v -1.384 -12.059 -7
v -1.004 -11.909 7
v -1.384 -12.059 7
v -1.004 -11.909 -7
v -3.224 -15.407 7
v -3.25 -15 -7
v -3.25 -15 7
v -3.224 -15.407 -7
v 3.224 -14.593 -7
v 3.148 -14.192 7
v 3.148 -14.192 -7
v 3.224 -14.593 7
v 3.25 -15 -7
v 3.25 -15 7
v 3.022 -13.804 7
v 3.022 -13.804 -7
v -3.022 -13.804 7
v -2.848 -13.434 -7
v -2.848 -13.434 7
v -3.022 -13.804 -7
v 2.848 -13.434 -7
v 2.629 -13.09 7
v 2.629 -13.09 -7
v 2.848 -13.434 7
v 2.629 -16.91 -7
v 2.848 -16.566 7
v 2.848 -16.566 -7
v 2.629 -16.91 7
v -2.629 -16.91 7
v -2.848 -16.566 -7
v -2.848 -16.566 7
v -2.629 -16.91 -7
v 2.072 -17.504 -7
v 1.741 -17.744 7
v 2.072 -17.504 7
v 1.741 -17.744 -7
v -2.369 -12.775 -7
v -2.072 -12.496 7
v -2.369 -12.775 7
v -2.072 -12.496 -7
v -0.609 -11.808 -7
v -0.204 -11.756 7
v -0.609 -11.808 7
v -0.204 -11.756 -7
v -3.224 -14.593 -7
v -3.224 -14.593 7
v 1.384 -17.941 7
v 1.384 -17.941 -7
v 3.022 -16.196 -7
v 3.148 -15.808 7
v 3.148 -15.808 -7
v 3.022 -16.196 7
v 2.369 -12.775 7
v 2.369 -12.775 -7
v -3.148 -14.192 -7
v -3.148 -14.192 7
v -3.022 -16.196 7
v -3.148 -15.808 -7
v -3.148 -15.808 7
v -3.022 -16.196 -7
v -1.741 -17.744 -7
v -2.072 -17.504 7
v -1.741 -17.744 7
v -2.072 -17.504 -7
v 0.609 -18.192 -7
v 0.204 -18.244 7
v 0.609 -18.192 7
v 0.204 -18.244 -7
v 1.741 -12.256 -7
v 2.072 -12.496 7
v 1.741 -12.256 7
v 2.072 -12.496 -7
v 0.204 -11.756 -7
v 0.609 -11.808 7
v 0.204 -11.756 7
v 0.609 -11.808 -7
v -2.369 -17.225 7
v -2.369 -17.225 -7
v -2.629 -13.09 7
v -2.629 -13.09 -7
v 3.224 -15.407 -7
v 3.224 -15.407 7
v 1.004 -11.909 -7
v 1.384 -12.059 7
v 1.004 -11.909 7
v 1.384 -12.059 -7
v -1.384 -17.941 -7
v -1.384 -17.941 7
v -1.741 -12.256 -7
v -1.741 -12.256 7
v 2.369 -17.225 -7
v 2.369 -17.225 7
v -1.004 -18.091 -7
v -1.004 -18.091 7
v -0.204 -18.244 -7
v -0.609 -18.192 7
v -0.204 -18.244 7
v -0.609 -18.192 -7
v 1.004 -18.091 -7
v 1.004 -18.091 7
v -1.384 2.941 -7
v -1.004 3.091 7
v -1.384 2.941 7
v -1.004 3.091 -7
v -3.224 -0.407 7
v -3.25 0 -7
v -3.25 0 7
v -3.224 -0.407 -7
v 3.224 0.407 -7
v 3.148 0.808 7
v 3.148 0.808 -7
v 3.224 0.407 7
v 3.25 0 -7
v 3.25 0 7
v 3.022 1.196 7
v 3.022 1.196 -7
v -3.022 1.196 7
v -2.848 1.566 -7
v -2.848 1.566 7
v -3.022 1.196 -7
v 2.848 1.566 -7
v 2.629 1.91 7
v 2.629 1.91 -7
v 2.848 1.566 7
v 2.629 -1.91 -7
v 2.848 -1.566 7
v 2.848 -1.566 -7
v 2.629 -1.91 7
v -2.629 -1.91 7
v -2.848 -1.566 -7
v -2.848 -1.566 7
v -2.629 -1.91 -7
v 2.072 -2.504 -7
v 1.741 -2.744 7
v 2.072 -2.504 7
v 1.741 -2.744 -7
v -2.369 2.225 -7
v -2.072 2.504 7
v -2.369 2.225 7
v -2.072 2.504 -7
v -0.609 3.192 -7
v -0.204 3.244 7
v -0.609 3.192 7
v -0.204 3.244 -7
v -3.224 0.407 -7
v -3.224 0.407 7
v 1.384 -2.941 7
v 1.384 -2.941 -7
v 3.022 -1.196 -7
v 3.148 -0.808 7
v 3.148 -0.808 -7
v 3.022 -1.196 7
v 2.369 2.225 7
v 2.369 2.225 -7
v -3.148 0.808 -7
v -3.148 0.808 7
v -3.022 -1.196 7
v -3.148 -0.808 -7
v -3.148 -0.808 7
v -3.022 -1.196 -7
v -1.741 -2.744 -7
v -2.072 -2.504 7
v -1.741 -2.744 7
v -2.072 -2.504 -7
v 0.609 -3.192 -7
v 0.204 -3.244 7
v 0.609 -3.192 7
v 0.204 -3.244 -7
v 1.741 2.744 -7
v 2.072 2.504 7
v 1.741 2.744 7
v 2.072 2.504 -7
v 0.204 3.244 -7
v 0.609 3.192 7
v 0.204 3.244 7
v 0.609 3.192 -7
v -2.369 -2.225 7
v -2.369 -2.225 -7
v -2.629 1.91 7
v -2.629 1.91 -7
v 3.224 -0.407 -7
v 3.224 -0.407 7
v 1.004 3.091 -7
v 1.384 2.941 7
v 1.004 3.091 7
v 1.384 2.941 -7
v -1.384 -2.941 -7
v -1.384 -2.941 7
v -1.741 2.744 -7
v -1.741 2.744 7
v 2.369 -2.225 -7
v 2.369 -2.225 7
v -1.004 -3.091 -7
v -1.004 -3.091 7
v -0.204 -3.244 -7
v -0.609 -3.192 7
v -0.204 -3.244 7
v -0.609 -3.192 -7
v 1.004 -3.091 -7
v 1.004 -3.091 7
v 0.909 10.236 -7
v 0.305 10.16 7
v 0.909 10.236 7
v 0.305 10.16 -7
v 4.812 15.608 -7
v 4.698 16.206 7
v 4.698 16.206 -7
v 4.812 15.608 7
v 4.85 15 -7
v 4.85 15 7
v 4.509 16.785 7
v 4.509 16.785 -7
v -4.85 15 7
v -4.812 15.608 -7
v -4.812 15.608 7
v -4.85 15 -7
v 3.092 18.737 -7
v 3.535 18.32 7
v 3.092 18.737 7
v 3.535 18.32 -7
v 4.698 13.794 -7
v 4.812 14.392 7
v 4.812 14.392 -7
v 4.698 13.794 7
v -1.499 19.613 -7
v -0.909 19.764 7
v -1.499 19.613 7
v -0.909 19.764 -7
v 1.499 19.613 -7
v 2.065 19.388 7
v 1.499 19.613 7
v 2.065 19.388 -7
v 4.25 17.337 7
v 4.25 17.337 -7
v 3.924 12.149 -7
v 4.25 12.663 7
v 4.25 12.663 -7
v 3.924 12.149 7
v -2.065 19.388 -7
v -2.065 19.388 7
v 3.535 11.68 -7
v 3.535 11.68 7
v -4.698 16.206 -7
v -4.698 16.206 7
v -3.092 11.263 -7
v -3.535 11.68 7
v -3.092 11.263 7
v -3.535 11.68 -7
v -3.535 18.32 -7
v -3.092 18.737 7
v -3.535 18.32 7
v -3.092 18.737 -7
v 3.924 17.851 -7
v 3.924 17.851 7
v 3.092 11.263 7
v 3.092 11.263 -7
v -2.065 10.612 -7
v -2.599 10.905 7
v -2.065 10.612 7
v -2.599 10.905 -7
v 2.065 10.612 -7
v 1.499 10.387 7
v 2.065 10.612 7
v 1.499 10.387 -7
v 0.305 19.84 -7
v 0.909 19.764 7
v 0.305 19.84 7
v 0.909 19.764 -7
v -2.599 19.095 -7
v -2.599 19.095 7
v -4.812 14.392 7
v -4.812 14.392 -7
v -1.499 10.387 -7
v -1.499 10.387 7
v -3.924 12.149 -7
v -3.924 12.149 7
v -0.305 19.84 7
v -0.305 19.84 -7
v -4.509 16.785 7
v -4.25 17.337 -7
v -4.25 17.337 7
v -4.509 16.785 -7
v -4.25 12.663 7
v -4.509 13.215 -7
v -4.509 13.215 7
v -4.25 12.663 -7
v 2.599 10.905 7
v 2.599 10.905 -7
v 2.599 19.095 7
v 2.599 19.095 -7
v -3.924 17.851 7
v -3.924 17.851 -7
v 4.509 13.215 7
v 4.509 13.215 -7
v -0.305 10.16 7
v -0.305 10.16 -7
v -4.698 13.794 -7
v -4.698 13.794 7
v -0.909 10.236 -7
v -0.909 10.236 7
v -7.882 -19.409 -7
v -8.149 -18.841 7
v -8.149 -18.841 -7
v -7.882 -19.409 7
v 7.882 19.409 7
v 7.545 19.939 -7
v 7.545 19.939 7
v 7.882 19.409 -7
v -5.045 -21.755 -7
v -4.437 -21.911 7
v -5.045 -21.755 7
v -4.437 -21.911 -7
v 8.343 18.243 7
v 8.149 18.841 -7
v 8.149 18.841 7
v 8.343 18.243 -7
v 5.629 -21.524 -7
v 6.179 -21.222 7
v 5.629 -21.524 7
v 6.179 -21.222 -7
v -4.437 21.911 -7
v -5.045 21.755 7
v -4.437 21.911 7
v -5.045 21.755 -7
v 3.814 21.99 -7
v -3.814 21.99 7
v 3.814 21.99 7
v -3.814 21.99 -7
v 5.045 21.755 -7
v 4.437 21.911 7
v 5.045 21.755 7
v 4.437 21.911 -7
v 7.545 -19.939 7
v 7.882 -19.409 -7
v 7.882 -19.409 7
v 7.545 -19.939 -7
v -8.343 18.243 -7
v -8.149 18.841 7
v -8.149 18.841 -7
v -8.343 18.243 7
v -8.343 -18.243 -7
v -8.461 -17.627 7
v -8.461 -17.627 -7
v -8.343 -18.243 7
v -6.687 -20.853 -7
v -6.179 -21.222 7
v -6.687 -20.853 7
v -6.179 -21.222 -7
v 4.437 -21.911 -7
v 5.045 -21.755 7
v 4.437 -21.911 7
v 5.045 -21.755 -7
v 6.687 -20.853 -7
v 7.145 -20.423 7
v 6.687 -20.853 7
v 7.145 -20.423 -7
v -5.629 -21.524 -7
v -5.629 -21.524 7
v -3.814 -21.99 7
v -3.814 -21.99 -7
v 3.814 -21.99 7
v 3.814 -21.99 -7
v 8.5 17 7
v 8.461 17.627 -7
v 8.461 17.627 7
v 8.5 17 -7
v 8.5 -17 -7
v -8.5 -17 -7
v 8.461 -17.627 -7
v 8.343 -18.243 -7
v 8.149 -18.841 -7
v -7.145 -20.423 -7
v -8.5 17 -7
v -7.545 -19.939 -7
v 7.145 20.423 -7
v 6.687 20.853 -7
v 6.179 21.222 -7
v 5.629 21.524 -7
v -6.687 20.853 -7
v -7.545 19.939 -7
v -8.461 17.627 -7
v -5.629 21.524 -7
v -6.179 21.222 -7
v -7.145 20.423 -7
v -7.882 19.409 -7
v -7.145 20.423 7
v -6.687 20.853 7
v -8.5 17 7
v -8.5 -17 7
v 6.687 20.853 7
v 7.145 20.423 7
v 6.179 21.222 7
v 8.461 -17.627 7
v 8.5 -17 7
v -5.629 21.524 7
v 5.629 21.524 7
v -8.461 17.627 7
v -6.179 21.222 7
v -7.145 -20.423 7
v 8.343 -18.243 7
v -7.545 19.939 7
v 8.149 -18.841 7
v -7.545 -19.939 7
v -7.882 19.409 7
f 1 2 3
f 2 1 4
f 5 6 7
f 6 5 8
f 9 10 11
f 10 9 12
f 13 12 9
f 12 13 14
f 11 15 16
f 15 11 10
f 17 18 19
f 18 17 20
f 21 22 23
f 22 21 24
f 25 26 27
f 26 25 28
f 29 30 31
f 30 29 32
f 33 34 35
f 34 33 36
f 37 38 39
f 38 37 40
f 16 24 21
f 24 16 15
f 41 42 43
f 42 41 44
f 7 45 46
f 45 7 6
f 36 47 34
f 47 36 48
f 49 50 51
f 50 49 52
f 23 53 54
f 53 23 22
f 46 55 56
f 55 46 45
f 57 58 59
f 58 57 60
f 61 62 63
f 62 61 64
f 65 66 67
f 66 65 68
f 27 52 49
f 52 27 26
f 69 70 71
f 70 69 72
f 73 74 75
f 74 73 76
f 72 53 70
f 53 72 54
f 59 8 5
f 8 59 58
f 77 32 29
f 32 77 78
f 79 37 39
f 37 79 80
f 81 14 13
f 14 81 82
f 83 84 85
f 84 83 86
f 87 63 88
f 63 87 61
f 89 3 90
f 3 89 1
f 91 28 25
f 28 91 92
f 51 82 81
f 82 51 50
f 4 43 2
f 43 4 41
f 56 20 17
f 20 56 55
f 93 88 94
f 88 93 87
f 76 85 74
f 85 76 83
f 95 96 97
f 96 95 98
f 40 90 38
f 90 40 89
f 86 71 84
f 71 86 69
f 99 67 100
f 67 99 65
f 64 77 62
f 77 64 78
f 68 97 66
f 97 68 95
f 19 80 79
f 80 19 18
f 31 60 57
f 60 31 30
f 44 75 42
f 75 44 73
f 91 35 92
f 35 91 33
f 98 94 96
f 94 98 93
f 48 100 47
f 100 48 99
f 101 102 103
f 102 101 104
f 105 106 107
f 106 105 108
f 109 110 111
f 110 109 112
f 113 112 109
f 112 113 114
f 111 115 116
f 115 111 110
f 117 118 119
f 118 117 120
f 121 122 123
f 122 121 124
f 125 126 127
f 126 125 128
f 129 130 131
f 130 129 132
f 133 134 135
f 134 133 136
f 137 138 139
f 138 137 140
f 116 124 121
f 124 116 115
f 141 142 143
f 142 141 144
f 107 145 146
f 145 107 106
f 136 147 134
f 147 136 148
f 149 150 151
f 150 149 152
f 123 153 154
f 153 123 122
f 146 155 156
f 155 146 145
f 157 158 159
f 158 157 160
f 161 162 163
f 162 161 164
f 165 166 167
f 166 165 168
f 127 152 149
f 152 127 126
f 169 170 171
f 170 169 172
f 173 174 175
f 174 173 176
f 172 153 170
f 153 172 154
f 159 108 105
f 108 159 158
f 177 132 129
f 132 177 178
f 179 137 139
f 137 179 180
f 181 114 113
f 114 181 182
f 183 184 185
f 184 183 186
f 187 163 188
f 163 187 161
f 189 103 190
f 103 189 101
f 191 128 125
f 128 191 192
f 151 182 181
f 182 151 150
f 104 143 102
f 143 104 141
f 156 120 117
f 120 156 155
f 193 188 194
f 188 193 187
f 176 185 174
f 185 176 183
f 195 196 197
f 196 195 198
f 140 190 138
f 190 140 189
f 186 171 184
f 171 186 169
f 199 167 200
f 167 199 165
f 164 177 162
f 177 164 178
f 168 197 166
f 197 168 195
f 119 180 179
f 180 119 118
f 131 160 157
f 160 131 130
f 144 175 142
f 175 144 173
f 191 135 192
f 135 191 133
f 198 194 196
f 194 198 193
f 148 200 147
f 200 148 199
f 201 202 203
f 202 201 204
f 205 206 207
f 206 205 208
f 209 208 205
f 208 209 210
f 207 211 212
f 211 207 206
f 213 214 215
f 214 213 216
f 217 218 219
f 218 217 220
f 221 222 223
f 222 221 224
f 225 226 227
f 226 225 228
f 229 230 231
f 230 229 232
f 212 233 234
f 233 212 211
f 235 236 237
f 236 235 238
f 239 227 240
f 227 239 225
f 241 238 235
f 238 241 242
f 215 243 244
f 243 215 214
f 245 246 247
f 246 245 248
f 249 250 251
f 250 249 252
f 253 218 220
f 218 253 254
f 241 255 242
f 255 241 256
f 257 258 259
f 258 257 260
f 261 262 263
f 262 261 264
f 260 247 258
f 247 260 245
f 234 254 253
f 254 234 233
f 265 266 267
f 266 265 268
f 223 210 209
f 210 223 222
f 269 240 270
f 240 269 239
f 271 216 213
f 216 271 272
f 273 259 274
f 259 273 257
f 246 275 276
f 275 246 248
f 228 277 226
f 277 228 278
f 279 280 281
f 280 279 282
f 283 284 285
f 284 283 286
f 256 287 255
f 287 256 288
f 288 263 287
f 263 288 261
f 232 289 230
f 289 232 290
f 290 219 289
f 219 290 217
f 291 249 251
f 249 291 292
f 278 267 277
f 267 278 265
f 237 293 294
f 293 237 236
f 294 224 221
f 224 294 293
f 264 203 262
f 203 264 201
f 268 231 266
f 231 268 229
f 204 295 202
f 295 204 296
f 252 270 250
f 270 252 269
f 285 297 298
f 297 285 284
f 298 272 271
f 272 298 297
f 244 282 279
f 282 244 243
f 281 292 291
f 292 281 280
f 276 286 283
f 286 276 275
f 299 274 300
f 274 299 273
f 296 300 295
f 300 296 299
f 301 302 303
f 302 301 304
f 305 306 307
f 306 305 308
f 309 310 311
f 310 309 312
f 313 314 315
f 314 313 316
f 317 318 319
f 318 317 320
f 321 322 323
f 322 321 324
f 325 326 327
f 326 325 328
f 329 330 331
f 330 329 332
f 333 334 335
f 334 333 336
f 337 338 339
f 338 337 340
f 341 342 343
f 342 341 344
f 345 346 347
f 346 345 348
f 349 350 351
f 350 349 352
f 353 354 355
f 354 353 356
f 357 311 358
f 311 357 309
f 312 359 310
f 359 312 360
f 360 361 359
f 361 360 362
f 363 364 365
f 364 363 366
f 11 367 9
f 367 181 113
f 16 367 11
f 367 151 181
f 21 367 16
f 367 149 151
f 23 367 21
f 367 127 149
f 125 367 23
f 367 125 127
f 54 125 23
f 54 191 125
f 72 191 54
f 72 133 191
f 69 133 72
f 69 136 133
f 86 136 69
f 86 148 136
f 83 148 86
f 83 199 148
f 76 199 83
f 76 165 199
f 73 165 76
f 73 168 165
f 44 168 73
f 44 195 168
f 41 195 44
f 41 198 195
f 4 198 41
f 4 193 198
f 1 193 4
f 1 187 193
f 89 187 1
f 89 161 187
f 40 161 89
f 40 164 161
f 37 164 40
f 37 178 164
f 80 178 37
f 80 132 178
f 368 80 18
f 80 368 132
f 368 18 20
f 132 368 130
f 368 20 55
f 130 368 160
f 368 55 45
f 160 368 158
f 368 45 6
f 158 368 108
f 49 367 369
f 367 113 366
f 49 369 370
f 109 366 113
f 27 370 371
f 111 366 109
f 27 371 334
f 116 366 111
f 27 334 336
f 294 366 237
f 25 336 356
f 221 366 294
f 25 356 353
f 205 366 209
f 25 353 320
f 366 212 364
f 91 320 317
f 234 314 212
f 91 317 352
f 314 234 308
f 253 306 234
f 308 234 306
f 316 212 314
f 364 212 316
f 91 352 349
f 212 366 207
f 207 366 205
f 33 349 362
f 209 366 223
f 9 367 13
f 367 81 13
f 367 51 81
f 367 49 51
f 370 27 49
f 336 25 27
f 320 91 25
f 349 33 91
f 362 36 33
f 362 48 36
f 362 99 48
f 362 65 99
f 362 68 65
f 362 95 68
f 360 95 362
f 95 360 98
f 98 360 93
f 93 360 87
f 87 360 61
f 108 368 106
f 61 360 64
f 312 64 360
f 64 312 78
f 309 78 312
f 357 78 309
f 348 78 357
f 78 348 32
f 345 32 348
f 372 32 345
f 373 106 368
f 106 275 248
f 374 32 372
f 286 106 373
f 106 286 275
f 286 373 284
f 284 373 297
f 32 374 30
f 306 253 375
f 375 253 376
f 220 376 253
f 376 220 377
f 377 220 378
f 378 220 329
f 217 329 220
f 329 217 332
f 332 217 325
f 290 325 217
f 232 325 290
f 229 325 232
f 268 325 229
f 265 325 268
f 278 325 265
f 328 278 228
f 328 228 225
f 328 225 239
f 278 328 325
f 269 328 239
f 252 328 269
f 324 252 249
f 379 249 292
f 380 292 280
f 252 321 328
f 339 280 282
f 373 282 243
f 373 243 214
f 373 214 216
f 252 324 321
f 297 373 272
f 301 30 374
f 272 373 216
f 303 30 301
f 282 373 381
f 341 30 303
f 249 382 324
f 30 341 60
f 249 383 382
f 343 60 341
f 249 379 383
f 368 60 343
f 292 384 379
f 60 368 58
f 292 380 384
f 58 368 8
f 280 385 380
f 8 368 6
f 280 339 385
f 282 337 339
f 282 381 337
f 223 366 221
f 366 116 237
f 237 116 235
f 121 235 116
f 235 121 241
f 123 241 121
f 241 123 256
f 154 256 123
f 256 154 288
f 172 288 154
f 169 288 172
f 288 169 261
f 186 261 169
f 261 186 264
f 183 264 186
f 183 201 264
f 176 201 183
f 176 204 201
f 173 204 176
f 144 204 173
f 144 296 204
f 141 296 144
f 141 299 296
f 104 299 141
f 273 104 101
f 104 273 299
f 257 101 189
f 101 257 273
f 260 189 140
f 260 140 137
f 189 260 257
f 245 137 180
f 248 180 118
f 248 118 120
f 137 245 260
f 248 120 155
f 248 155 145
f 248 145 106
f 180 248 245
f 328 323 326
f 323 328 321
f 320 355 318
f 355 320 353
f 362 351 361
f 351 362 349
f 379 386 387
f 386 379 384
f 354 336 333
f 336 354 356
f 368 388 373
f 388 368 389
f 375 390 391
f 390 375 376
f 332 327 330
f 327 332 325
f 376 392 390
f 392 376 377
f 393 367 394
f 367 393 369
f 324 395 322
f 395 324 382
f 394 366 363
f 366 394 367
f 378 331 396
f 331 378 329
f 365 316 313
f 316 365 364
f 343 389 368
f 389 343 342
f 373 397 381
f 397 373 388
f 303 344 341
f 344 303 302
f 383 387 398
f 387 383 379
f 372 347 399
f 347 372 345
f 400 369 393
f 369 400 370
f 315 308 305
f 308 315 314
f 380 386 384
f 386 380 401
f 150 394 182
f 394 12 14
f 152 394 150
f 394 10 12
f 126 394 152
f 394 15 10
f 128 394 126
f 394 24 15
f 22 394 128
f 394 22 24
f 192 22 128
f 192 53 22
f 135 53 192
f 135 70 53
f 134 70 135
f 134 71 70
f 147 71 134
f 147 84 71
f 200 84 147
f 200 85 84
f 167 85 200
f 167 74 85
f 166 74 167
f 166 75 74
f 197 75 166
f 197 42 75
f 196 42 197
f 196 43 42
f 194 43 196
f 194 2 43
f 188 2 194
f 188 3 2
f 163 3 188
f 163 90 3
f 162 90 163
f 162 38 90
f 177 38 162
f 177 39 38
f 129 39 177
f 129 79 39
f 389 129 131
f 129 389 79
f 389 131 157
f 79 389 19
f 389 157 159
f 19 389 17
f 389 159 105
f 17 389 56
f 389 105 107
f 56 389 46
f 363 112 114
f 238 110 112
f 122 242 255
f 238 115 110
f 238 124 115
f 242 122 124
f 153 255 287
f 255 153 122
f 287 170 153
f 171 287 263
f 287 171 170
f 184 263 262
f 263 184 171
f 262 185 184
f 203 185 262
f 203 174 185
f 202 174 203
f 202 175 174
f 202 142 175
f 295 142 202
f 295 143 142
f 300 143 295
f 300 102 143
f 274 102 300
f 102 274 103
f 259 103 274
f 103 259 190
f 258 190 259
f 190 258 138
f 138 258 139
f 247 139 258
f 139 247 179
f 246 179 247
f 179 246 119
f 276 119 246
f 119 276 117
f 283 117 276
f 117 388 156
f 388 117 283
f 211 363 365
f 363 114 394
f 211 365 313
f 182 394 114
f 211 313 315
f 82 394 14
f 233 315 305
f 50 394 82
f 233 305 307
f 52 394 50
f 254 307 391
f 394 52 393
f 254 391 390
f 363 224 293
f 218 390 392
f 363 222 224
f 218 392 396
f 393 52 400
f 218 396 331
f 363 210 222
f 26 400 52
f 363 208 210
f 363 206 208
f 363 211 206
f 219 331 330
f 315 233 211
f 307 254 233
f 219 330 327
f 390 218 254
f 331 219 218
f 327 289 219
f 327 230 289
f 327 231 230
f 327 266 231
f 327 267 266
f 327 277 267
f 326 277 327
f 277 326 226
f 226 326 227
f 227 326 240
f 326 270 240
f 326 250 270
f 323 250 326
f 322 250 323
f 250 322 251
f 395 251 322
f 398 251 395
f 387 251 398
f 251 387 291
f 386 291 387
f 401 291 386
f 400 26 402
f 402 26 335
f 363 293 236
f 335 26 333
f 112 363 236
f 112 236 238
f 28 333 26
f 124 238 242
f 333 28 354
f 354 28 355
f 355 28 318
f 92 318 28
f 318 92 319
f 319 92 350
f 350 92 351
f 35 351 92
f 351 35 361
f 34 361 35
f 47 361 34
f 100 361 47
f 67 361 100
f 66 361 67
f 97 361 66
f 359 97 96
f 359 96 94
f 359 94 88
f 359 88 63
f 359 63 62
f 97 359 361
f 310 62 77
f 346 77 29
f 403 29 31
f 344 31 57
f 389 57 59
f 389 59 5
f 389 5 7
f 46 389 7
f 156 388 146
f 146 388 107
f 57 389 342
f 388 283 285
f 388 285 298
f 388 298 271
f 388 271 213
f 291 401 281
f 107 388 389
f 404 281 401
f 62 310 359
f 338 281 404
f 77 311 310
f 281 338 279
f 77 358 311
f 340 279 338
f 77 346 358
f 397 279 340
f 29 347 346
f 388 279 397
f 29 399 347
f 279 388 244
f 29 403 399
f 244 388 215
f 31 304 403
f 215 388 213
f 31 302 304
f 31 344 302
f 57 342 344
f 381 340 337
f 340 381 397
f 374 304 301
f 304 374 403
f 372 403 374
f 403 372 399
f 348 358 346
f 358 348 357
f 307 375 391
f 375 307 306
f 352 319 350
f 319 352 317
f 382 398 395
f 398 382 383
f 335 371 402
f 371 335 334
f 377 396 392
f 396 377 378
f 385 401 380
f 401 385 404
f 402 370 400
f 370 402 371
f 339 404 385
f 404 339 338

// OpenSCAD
$fn = 50;


difference() {
	union() {
		translate(v = [0, 0, -7.0000000000]) {
			hull() {
				translate(v = [-3.5000000000, 17.0000000000, 0]) {
					cylinder(h = 14, r = 5);
				}
				translate(v = [3.5000000000, 17.0000000000, 0]) {
					cylinder(h = 14, r = 5);
				}
				translate(v = [-3.5000000000, -17.0000000000, 0]) {
					cylinder(h = 14, r = 5);
				}
				translate(v = [3.5000000000, -17.0000000000, 0]) {
					cylinder(h = 14, r = 5);
				}
			}
		}
	}
	union() {
		translate(v = [0.0000000000, -15.0000000000, -50.0000000000]) {
			cylinder(h = 100, r = 3.2500000000);
		}
		translate(v = [0.0000000000, 0.0000000000, -50.0000000000]) {
			cylinder(h = 100, r = 3.2500000000);
		}
		translate(v = [0, 15, -50.0000000000]) {
			cylinder(h = 100, r = 4.8500000000);
		}
	}
}
